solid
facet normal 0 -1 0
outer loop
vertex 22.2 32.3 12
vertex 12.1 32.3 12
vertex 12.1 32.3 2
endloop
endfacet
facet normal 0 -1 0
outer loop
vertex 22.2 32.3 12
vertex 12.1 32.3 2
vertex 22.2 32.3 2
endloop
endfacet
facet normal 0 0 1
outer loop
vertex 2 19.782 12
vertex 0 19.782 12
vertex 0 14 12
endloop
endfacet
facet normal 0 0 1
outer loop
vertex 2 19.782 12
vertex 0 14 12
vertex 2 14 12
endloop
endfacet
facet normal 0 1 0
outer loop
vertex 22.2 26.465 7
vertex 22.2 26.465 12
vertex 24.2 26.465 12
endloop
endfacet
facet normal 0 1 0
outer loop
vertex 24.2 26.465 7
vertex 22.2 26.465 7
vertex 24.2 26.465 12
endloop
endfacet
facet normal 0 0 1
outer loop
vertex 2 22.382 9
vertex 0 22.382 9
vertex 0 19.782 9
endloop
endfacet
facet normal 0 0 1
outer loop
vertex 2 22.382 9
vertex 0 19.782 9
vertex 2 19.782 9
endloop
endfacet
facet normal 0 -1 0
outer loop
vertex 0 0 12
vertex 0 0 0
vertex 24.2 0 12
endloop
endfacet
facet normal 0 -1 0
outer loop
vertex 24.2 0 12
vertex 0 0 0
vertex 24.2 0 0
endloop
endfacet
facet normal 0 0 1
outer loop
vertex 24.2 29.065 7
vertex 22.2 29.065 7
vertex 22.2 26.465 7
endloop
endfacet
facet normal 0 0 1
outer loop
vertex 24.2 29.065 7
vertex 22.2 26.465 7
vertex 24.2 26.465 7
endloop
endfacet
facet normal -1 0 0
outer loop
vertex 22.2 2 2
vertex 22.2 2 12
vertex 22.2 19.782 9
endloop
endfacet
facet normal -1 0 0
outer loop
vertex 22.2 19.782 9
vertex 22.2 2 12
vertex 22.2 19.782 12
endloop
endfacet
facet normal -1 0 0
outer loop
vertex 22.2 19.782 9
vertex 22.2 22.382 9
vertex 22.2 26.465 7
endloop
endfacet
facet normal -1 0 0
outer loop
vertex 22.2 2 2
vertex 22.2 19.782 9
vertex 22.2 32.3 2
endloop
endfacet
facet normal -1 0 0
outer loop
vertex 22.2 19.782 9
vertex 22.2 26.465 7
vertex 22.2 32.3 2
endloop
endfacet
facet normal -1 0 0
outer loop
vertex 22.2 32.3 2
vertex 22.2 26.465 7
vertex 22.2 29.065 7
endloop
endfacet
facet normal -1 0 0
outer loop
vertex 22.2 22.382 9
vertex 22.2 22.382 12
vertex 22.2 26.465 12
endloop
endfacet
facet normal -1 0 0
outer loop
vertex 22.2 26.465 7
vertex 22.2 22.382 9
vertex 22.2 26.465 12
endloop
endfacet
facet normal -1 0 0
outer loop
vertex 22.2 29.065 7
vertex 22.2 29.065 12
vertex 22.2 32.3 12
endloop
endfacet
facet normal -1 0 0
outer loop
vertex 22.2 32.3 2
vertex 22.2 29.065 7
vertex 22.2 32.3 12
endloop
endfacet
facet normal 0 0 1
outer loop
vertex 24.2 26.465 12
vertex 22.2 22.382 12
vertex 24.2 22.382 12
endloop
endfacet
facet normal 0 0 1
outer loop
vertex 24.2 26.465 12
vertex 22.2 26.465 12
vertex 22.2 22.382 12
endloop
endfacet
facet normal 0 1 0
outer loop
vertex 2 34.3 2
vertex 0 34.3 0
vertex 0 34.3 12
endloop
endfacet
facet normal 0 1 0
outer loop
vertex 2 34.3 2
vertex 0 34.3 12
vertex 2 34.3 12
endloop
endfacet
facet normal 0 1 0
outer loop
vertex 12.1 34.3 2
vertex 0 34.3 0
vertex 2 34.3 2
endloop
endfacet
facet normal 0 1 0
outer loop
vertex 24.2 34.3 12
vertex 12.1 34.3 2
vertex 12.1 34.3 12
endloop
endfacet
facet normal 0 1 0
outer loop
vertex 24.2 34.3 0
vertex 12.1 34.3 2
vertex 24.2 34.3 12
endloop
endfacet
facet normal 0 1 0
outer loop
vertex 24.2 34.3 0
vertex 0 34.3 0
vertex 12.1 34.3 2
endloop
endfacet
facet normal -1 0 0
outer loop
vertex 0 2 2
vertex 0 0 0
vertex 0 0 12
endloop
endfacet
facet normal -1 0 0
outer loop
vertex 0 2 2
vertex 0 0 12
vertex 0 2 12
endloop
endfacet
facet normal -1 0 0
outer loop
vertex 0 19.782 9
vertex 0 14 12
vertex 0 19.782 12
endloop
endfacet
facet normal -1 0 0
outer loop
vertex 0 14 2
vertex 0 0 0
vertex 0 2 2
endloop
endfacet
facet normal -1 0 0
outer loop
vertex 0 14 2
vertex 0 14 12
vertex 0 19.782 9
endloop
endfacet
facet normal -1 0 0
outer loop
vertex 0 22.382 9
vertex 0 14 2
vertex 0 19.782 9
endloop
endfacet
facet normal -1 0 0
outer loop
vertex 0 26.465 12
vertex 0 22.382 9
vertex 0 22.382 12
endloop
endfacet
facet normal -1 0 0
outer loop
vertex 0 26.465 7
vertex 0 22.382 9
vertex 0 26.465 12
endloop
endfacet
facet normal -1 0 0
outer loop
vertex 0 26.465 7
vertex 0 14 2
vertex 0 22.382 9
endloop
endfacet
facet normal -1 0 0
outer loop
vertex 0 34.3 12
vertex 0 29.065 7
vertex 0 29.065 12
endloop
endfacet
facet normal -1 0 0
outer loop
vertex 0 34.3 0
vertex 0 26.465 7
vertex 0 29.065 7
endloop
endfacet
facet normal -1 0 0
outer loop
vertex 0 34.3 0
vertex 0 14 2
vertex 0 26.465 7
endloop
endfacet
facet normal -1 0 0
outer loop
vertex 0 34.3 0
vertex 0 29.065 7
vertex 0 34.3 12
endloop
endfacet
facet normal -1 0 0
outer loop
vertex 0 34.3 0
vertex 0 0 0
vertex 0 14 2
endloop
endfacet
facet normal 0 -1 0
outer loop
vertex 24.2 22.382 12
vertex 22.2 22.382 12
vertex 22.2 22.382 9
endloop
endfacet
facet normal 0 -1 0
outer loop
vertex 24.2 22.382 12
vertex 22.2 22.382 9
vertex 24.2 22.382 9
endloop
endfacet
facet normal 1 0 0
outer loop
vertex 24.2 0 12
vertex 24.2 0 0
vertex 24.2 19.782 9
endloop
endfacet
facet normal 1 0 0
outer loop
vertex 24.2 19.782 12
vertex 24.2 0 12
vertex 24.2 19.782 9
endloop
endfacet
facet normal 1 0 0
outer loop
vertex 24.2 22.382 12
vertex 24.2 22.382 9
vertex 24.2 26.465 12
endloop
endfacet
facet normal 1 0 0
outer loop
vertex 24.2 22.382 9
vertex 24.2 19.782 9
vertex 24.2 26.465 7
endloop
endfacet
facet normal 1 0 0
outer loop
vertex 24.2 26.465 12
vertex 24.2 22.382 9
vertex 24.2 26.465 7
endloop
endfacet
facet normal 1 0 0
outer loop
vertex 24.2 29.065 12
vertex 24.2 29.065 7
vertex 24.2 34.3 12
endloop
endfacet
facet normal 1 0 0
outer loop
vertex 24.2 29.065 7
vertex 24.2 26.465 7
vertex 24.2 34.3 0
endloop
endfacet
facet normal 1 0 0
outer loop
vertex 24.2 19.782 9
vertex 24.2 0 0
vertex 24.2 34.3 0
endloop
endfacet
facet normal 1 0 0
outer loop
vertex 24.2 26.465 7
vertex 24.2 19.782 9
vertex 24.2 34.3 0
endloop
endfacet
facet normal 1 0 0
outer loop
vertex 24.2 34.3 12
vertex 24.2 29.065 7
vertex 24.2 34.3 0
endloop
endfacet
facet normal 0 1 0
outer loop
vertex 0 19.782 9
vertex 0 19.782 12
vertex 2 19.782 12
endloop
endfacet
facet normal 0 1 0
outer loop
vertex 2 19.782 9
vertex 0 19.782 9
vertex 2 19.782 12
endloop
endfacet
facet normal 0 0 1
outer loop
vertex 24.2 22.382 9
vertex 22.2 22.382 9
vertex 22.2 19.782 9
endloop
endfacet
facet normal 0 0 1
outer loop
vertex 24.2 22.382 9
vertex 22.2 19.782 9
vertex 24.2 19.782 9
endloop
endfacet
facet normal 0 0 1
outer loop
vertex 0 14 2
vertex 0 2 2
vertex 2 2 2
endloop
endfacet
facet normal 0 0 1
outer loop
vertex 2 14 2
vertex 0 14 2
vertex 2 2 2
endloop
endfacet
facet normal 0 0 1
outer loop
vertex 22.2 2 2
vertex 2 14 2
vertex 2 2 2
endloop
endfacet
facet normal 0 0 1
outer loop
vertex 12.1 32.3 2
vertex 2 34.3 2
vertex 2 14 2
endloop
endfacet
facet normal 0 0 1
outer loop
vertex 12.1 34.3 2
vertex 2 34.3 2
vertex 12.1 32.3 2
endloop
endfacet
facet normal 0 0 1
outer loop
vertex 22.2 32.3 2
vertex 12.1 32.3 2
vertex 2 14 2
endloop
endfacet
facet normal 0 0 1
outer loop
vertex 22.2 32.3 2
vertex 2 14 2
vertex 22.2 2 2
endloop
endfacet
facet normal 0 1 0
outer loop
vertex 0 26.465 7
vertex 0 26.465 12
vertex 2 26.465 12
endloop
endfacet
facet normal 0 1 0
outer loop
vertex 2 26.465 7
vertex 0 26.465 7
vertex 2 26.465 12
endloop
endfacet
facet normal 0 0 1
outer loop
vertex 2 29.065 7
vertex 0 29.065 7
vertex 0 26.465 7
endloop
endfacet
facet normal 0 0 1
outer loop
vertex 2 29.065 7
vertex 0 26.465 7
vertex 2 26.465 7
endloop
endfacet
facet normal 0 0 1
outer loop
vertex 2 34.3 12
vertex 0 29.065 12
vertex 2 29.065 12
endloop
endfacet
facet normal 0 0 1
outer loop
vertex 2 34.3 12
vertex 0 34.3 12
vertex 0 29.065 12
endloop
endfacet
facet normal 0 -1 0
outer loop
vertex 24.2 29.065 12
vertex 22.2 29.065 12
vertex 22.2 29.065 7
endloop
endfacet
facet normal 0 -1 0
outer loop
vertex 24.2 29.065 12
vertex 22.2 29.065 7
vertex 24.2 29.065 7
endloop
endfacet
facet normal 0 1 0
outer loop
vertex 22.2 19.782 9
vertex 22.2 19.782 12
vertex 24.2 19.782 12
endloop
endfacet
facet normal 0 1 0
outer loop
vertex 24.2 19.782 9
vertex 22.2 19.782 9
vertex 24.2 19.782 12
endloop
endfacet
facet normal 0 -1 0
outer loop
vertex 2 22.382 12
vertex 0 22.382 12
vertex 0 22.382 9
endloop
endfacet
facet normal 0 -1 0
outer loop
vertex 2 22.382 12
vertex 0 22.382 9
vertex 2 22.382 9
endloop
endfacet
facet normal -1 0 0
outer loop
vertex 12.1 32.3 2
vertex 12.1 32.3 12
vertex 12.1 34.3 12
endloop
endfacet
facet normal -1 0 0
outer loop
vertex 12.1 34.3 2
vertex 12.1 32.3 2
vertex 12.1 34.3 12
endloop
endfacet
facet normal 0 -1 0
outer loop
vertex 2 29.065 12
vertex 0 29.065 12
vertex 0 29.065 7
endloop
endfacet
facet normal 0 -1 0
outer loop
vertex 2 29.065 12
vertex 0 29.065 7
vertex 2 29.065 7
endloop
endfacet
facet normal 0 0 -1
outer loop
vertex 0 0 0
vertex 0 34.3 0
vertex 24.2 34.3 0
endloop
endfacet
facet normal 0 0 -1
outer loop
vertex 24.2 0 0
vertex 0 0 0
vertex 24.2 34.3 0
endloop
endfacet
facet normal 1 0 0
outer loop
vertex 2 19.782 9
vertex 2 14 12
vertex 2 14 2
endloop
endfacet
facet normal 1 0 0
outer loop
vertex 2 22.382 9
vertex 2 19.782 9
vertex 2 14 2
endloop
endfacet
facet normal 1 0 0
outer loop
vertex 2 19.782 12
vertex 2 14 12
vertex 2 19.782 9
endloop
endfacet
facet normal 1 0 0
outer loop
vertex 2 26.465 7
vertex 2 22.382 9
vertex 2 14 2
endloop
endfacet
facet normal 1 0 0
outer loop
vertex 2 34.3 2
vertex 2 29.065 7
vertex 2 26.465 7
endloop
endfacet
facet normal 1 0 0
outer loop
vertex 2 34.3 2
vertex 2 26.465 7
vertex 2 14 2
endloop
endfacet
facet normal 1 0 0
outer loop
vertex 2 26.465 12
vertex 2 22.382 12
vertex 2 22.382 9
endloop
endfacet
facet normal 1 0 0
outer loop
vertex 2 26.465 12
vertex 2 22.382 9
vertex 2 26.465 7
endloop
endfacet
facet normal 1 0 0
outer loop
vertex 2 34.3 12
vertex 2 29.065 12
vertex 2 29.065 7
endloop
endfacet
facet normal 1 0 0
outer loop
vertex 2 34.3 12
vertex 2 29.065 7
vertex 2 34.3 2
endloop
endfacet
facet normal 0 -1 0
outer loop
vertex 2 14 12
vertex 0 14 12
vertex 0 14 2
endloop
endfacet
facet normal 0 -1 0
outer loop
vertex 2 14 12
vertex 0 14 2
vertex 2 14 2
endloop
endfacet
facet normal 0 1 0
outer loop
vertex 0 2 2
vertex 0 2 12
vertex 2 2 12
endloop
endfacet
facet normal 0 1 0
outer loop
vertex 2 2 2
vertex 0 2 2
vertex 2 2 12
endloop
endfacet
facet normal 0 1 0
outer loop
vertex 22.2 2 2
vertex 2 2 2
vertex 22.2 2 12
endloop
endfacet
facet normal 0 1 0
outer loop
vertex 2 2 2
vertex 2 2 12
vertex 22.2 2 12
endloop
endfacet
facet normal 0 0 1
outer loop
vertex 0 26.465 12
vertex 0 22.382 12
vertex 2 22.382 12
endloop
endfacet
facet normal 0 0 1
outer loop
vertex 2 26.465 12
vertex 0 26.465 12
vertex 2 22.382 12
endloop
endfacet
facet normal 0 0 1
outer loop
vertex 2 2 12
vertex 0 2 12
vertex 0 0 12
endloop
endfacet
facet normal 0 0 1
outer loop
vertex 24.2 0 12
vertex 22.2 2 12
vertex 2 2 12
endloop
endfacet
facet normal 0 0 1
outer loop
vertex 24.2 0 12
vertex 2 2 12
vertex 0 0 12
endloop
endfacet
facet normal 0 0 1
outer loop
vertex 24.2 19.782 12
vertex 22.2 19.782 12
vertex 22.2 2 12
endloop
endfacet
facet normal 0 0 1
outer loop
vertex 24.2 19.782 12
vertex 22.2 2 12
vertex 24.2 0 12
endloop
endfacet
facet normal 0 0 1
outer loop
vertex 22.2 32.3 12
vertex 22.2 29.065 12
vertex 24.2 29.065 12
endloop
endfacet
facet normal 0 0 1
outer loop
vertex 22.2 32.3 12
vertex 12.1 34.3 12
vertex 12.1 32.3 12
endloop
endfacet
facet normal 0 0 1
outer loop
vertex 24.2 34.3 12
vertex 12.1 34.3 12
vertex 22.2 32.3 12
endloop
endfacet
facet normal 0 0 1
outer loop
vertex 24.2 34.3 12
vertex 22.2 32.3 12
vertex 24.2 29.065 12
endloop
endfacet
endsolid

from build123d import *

# Parameters (mm, degrees)
F0_W      = 24.2
F0_H      = 34.3
F1_DEPTH  = 12
F2_W      = 20.1999982953
F2_H      = 30.2999982953
F3_DEPTH  = 10
F4_W      = 2.0000008523
F4_H      = 12
F5_DEPTH  = 10
F6_W      = 10.0999991477
F6_H      = 2.0000008523
F7_DEPTH  = 10
F8_W      = 24.2
F8_H      = 2.6
F9_DEPTH  = 5
F10_W     = 24.2
F10_H     = 2.6
F11_DEPTH = 3


with BuildPart() as f1:
    # F0 (on Top) → F1 (new body)
    with BuildSketch(Plane.XY):
        with Locations((12.1, 17.15)):
            Rectangle(F0_W, F0_H)
    extrude(amount=F1_DEPTH)

    # F2 (on face) → F3 (cut)
    with BuildSketch(Plane.XY.offset(12)):
        with Locations((12.1, 17.15)):
            Rectangle(F2_W, F2_H)
    extrude(amount=-F3_DEPTH, mode=Mode.SUBTRACT)

    # F4 (on face) → F5 (cut)
    with BuildSketch(Plane.XY.offset(12)):
        with Locations((1.0000004262, 8.0000008523)):
            Rectangle(F4_W, F4_H)
    extrude(amount=-F5_DEPTH, mode=Mode.SUBTRACT)

    # F6 (on face) → F7 (cut)
    with BuildSketch(Plane.XY.offset(12)):
        with Locations((7.0500004262, 33.2999995738)):
            Rectangle(F6_W, F6_H)
    extrude(amount=-F7_DEPTH, mode=Mode.SUBTRACT)

    # F8 (on face) → F9 (cut)
    with BuildSketch(Plane.XY.offset(12)):
        with Locations((12.1, 27.7652371407)):
            Rectangle(F8_W, F8_H)
    extrude(amount=-F9_DEPTH, mode=Mode.SUBTRACT)

    # F10 (on face) → F11 (cut)
    with BuildSketch(Plane.XY.offset(12)):
        with Locations((12.1, 21.0815354913)):
            Rectangle(F10_W, F10_H)
    extrude(amount=-F11_DEPTH, mode=Mode.SUBTRACT)


solid = f1.part
